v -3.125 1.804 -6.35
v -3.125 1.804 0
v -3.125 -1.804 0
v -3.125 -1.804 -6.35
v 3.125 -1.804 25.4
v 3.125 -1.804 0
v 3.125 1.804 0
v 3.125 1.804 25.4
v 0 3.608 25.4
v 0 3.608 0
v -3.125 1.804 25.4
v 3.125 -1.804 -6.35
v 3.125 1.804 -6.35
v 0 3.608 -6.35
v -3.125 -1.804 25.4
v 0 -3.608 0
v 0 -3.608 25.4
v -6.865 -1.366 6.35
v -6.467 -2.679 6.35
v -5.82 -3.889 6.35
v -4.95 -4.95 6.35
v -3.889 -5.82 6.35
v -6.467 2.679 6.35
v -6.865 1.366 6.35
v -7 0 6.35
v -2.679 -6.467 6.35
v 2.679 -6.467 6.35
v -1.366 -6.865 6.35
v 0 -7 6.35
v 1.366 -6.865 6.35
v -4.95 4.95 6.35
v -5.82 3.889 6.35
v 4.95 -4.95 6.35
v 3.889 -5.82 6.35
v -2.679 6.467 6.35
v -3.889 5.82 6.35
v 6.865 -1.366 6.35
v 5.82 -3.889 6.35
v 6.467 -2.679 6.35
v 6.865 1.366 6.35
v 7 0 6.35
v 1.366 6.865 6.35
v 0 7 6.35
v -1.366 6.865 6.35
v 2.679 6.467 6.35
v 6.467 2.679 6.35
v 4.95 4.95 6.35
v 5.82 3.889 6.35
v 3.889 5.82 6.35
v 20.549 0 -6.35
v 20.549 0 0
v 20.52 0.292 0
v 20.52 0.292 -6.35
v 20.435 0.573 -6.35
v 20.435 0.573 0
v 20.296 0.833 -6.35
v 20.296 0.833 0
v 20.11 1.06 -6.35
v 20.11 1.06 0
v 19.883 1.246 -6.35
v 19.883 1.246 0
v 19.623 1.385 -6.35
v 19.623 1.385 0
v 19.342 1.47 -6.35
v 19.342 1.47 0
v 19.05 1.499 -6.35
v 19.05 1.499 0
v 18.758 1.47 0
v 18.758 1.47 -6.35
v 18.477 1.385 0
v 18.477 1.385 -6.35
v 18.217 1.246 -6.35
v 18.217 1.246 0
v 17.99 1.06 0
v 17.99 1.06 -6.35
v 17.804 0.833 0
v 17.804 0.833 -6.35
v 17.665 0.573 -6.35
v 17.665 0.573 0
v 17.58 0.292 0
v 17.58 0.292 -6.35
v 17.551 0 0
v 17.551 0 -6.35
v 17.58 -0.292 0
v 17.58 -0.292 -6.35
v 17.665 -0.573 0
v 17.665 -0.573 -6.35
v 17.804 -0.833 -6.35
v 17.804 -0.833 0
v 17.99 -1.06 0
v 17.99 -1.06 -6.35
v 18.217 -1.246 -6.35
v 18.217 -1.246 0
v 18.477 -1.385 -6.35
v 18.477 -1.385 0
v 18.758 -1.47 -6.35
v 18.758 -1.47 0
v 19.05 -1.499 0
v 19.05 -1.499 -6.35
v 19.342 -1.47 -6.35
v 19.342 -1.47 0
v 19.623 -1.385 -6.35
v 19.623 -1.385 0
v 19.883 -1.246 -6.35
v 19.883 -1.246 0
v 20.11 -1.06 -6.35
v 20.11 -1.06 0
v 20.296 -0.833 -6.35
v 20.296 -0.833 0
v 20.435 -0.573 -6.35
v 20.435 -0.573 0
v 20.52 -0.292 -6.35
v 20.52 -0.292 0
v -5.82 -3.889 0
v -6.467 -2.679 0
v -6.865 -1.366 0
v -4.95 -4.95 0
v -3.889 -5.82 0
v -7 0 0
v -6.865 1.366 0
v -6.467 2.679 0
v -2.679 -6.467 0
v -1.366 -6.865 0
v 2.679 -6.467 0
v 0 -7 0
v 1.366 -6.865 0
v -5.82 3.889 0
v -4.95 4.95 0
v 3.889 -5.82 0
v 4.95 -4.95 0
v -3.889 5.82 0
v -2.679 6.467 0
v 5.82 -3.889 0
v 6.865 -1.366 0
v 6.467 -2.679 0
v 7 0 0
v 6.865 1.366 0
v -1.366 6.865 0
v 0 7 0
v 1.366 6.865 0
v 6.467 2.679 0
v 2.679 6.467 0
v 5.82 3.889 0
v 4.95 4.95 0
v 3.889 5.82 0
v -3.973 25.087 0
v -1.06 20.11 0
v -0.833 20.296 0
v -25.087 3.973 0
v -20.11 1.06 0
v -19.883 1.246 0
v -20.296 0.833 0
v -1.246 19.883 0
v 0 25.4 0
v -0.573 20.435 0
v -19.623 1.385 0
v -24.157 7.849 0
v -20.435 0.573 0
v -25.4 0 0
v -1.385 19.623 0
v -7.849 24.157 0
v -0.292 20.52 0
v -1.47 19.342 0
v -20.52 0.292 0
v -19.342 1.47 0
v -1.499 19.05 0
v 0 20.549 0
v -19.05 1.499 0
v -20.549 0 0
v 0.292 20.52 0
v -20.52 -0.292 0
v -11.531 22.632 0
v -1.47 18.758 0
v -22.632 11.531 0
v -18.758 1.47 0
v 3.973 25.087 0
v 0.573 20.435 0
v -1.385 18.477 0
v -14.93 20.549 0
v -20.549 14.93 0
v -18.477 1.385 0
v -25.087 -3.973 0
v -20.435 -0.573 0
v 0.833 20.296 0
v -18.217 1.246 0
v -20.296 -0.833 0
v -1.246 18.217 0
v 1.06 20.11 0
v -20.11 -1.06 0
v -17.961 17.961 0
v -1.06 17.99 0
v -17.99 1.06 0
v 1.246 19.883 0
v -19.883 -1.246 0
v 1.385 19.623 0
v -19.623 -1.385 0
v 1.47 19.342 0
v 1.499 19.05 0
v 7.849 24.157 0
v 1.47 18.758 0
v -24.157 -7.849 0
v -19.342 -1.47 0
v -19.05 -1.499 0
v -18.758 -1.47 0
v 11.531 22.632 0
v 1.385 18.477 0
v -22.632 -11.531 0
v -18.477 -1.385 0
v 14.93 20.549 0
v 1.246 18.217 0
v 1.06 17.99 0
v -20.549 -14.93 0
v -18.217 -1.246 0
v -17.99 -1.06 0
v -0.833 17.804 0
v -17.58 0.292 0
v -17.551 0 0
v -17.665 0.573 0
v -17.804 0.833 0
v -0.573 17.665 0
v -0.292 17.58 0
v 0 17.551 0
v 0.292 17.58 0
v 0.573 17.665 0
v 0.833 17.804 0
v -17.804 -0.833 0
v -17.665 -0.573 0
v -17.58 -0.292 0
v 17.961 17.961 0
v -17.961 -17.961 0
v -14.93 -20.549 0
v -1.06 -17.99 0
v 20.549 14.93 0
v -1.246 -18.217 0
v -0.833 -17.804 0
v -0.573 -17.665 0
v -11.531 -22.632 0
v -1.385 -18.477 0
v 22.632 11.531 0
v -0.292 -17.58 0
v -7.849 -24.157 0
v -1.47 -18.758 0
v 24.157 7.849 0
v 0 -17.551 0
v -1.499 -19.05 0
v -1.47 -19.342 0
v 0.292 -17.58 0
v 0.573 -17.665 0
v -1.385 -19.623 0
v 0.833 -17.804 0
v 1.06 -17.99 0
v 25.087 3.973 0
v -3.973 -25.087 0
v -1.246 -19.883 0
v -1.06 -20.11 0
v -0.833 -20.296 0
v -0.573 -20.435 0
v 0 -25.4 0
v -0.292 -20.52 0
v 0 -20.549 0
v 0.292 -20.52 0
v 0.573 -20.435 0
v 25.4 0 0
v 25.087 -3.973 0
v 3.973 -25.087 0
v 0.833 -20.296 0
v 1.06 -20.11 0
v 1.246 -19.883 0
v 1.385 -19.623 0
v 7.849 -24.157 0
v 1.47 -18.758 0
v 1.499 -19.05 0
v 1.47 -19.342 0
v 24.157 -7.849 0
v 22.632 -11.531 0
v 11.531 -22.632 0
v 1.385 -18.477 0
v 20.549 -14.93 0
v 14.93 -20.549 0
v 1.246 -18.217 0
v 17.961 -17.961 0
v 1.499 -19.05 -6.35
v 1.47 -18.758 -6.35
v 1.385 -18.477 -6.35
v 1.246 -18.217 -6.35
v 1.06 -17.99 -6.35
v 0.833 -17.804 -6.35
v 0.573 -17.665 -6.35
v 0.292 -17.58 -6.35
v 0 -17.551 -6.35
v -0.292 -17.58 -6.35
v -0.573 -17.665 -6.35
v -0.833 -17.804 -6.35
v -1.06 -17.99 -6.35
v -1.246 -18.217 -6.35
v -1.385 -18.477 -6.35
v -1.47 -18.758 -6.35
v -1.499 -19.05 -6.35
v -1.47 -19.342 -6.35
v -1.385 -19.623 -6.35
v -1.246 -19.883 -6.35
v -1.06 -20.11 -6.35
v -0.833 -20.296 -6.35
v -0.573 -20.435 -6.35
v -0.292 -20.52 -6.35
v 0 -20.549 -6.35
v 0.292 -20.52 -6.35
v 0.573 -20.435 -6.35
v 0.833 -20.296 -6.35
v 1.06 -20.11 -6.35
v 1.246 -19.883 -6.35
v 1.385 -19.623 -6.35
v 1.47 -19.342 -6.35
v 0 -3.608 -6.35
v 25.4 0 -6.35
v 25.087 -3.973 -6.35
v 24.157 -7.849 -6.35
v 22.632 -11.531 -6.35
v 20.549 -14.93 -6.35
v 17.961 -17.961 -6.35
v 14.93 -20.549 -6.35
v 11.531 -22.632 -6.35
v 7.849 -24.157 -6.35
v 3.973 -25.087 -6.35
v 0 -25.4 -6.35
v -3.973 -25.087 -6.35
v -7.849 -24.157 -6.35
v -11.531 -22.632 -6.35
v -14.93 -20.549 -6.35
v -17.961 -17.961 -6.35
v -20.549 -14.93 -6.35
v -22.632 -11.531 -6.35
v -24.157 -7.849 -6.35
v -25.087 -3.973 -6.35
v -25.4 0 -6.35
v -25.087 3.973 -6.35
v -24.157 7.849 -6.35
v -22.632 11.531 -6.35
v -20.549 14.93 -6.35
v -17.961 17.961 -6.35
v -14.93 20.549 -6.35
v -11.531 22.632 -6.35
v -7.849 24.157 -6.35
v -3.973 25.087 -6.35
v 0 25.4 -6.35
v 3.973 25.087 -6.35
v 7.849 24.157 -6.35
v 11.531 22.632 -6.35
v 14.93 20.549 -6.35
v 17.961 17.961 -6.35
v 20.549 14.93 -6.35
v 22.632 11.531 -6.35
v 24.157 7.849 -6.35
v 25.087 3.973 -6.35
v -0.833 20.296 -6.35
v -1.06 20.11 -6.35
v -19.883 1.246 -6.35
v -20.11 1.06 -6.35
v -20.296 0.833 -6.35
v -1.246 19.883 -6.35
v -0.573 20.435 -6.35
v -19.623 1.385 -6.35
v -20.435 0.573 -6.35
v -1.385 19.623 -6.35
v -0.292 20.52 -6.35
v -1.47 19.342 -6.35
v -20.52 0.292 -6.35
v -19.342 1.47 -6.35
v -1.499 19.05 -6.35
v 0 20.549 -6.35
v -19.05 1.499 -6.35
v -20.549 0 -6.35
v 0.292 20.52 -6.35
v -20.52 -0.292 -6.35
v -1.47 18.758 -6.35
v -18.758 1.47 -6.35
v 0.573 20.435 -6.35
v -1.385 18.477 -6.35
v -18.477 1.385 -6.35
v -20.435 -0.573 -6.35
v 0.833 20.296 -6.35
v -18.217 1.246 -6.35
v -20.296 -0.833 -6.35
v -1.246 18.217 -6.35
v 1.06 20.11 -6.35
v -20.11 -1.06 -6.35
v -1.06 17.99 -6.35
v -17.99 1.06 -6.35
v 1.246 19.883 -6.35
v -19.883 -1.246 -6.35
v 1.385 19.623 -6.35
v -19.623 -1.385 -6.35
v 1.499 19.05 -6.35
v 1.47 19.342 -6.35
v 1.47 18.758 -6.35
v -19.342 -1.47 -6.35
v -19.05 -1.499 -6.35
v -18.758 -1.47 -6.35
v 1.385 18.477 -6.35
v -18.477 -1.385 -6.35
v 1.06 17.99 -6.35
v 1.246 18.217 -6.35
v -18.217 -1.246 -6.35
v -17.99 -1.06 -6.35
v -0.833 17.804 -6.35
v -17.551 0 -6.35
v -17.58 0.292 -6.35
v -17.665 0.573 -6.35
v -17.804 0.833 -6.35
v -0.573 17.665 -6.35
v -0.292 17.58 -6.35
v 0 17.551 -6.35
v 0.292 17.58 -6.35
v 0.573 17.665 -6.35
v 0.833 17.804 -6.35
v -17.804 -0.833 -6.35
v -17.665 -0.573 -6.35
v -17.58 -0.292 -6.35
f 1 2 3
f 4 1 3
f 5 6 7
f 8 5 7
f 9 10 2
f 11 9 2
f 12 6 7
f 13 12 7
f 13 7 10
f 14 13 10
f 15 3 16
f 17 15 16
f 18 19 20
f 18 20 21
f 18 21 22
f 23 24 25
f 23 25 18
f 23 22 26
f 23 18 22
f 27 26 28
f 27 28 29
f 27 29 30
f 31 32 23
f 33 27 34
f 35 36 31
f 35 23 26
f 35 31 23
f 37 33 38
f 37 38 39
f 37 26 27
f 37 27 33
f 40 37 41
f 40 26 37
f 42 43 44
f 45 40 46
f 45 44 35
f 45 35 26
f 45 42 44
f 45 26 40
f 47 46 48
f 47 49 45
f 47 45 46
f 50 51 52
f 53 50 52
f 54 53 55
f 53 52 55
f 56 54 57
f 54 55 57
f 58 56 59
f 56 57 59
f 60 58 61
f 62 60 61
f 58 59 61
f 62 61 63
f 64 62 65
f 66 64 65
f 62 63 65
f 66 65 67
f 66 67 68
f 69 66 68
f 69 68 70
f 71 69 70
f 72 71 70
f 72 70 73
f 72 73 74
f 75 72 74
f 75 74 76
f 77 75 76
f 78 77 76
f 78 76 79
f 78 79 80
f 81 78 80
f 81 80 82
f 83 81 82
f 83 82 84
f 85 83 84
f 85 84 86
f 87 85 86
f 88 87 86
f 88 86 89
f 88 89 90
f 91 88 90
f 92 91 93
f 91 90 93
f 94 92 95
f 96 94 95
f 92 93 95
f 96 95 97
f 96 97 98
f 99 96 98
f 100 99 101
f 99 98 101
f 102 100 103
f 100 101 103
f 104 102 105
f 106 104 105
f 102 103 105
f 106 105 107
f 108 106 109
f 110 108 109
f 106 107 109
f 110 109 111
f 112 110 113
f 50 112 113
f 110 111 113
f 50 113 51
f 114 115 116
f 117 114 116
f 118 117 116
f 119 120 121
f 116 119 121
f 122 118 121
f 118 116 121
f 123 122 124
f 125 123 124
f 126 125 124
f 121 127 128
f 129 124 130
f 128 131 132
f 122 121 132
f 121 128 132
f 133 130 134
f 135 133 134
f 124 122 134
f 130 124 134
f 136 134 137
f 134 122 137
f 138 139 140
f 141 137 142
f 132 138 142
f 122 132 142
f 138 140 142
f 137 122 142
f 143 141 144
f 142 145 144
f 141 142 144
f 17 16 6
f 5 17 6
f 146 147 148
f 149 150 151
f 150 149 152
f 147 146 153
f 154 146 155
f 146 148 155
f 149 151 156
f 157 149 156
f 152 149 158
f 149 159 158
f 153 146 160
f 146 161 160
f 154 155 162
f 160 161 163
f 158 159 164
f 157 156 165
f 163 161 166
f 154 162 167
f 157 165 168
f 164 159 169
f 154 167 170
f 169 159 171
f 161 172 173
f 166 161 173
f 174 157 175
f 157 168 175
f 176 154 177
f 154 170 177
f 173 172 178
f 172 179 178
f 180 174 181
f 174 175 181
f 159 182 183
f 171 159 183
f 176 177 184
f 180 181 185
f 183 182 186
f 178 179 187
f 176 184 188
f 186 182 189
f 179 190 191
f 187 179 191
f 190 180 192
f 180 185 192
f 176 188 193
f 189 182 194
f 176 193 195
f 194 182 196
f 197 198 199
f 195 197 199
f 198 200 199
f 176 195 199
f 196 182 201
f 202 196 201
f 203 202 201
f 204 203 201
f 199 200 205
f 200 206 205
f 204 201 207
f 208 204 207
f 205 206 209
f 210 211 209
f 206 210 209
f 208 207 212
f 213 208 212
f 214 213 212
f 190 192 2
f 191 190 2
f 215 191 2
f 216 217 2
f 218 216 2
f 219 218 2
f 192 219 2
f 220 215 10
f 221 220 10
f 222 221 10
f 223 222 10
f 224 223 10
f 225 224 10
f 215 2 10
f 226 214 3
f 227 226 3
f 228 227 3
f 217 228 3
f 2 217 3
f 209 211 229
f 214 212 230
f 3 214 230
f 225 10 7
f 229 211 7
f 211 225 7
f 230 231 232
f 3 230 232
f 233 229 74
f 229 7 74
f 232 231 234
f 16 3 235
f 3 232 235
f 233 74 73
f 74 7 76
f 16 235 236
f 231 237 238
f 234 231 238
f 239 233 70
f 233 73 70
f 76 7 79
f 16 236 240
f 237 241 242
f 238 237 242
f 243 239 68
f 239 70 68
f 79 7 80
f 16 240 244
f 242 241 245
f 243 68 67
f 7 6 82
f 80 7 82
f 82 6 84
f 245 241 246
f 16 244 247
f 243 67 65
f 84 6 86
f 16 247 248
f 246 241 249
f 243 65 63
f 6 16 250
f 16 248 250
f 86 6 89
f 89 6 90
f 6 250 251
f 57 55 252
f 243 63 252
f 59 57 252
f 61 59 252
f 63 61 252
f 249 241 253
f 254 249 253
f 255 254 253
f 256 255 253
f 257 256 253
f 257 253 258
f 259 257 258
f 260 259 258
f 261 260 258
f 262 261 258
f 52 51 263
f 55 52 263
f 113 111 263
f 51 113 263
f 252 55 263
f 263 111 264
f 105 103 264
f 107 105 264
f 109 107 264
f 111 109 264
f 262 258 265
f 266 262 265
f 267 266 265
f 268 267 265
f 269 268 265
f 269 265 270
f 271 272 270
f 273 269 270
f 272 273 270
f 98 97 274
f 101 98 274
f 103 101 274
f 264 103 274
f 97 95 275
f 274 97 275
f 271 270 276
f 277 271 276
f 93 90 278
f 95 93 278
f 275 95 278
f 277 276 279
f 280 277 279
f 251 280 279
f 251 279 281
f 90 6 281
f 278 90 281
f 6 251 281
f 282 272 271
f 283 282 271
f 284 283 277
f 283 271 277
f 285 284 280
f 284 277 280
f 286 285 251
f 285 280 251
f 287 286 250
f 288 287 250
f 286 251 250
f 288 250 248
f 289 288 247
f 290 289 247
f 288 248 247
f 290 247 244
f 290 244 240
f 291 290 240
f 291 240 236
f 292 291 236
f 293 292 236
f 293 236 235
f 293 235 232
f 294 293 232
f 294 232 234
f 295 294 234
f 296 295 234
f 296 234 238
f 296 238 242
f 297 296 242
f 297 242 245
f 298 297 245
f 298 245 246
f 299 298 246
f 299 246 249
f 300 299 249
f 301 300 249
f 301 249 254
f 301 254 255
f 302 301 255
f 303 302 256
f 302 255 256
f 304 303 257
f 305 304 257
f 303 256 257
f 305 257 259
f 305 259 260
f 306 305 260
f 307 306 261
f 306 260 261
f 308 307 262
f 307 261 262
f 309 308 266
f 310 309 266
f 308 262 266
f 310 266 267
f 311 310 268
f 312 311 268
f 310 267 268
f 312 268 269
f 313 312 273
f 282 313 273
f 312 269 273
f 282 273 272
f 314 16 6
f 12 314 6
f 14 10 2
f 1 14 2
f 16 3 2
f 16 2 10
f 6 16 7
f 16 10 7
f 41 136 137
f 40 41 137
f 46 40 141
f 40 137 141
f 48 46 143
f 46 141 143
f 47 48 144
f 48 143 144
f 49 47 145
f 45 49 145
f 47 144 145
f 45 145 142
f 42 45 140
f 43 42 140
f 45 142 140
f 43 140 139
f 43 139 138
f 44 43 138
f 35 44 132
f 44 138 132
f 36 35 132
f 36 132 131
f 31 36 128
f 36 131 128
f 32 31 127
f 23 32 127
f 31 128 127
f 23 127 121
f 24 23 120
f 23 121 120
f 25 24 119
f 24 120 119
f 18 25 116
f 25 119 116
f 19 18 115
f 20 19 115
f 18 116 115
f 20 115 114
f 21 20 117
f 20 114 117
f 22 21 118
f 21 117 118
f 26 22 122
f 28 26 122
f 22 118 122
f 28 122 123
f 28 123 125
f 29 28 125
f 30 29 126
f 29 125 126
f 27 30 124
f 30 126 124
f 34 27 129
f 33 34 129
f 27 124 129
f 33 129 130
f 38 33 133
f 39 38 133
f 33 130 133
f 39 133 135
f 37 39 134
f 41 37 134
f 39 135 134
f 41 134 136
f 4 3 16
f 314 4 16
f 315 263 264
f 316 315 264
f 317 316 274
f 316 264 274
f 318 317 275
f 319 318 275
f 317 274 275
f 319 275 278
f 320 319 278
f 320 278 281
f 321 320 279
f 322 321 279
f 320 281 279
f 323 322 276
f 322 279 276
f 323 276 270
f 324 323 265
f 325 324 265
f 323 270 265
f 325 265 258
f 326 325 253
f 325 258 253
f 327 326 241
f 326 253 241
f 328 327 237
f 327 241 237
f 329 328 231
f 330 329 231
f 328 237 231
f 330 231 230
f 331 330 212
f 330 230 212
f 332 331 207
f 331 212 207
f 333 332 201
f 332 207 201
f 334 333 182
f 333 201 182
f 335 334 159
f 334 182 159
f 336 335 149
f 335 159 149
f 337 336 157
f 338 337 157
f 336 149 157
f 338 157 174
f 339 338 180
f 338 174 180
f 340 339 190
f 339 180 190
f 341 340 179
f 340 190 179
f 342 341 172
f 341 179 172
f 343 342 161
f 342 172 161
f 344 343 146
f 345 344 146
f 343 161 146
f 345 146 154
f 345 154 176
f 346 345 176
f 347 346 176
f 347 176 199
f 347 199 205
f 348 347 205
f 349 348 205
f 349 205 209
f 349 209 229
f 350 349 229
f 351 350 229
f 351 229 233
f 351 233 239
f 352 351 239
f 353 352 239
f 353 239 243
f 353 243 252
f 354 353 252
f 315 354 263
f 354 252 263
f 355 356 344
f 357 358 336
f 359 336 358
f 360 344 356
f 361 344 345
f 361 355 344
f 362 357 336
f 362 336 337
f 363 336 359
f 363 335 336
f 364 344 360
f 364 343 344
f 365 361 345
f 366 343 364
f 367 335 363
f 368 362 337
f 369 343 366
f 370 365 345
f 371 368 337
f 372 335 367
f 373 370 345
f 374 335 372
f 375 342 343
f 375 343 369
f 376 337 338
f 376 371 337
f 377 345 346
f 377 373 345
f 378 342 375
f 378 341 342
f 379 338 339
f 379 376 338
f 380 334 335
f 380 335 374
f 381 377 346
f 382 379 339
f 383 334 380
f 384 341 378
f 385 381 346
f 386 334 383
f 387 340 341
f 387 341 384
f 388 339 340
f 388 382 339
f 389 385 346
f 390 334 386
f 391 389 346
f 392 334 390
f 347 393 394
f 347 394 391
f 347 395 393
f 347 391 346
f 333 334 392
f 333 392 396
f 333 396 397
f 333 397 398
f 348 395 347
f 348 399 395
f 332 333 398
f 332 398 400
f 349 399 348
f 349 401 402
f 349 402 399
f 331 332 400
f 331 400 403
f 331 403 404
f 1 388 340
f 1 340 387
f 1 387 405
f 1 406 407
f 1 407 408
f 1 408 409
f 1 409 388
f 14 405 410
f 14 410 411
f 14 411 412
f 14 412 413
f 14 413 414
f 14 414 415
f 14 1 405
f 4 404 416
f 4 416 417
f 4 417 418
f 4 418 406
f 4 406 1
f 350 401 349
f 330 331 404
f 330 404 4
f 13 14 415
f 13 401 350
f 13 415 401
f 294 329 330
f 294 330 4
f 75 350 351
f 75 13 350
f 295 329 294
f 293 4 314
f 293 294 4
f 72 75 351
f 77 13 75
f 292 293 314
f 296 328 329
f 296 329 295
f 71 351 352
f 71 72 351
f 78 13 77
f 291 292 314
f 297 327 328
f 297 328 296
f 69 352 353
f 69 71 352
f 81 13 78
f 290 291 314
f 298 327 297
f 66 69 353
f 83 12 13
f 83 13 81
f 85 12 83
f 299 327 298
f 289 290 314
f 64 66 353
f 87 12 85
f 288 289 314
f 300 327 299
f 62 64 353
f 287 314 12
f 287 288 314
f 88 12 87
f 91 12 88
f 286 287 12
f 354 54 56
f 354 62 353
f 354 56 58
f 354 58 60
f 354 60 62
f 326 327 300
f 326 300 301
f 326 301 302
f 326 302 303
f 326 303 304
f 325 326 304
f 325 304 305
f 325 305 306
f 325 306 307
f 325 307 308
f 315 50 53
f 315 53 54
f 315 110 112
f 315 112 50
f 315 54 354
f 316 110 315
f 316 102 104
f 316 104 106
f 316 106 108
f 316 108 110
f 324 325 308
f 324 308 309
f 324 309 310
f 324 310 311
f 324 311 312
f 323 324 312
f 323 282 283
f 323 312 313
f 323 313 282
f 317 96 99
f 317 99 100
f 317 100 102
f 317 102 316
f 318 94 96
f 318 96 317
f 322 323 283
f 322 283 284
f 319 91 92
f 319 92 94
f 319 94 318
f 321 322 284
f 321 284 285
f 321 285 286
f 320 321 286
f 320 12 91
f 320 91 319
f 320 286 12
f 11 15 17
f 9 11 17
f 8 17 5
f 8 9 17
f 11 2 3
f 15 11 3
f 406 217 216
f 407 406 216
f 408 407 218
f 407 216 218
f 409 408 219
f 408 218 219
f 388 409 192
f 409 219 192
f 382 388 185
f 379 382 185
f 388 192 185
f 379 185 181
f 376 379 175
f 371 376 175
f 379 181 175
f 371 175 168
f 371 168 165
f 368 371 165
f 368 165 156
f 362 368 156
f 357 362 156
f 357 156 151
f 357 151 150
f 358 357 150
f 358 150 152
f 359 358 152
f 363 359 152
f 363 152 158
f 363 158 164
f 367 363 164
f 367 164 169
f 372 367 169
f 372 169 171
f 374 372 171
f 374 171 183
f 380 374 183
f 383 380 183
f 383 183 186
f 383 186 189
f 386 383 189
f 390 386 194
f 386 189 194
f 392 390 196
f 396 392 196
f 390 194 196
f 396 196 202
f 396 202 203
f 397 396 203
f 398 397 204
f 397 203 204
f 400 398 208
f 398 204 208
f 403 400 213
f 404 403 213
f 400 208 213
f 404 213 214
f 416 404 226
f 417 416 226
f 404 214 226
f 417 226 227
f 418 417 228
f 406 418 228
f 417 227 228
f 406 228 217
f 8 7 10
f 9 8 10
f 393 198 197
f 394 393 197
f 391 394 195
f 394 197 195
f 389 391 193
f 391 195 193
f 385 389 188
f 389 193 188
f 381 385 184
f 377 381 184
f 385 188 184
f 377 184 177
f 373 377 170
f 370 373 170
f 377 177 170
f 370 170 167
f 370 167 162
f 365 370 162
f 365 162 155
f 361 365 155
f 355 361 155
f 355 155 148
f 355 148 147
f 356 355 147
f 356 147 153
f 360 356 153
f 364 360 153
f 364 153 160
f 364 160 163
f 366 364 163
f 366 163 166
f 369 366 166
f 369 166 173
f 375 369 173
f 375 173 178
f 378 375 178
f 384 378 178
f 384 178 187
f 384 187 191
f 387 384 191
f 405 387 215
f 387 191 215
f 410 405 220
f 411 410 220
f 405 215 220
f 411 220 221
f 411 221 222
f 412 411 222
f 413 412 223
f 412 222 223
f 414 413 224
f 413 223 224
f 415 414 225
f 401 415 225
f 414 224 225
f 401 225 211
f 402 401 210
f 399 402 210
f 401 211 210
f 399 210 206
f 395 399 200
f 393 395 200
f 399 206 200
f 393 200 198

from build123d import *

# Parameters (mm, degrees)
F1_DEPTH = 25.4
F2_R     = 25.4
F3_DEPTH = 6.35
F4_R     = 7
F5_DEPTH = 6.35
F6_R     = 1.4986
F7_DEPTH = 25.4


with BuildPart() as f1:
    # F0 (on Top) → F1 (new body)
    with BuildSketch(Plane.XY):
        Polygon((3.125, -1.80422), (3.125, 1.80422), (0, 3.608439), (-3.125, 1.80422), (-3.125, -1.80422), (0, -3.608439), align=None)
    extrude(amount=F1_DEPTH)


with BuildPart() as f3:
    # F2 (on face) → F3 (new body)
    with BuildSketch(Plane(origin=(0, 0, 0), x_dir=(1, 0, 0), z_dir=(0, 0, -1))):
        Circle(F2_R)
        Polygon((0, 3.608439), (3.125, 1.80422), (3.125, -1.80422), (0, -3.608439), (-3.125, -1.80422), (-3.125, 1.80422), align=None, mode=Mode.SUBTRACT)
    extrude(amount=F3_DEPTH)

    # F6 (on face) → F7 (cut)
    with BuildSketch(Plane.XY):
        with Locations((0, 19.05)):
            Circle(F6_R)
        with Locations((19.05, 0)):
            Circle(F6_R)
        with Locations((0, -19.05)):
            Circle(F6_R)
        with Locations((-19.05, 0)):
            Circle(F6_R)
    extrude(amount=-F7_DEPTH, mode=Mode.SUBTRACT)


with BuildPart() as f5:
    # F4 (on face) → F5 (new body)
    with BuildSketch(Plane.XY):
        Circle(F4_R)
    extrude(amount=F5_DEPTH)


solid = Compound([f1.part, f3.part, f5.part])
